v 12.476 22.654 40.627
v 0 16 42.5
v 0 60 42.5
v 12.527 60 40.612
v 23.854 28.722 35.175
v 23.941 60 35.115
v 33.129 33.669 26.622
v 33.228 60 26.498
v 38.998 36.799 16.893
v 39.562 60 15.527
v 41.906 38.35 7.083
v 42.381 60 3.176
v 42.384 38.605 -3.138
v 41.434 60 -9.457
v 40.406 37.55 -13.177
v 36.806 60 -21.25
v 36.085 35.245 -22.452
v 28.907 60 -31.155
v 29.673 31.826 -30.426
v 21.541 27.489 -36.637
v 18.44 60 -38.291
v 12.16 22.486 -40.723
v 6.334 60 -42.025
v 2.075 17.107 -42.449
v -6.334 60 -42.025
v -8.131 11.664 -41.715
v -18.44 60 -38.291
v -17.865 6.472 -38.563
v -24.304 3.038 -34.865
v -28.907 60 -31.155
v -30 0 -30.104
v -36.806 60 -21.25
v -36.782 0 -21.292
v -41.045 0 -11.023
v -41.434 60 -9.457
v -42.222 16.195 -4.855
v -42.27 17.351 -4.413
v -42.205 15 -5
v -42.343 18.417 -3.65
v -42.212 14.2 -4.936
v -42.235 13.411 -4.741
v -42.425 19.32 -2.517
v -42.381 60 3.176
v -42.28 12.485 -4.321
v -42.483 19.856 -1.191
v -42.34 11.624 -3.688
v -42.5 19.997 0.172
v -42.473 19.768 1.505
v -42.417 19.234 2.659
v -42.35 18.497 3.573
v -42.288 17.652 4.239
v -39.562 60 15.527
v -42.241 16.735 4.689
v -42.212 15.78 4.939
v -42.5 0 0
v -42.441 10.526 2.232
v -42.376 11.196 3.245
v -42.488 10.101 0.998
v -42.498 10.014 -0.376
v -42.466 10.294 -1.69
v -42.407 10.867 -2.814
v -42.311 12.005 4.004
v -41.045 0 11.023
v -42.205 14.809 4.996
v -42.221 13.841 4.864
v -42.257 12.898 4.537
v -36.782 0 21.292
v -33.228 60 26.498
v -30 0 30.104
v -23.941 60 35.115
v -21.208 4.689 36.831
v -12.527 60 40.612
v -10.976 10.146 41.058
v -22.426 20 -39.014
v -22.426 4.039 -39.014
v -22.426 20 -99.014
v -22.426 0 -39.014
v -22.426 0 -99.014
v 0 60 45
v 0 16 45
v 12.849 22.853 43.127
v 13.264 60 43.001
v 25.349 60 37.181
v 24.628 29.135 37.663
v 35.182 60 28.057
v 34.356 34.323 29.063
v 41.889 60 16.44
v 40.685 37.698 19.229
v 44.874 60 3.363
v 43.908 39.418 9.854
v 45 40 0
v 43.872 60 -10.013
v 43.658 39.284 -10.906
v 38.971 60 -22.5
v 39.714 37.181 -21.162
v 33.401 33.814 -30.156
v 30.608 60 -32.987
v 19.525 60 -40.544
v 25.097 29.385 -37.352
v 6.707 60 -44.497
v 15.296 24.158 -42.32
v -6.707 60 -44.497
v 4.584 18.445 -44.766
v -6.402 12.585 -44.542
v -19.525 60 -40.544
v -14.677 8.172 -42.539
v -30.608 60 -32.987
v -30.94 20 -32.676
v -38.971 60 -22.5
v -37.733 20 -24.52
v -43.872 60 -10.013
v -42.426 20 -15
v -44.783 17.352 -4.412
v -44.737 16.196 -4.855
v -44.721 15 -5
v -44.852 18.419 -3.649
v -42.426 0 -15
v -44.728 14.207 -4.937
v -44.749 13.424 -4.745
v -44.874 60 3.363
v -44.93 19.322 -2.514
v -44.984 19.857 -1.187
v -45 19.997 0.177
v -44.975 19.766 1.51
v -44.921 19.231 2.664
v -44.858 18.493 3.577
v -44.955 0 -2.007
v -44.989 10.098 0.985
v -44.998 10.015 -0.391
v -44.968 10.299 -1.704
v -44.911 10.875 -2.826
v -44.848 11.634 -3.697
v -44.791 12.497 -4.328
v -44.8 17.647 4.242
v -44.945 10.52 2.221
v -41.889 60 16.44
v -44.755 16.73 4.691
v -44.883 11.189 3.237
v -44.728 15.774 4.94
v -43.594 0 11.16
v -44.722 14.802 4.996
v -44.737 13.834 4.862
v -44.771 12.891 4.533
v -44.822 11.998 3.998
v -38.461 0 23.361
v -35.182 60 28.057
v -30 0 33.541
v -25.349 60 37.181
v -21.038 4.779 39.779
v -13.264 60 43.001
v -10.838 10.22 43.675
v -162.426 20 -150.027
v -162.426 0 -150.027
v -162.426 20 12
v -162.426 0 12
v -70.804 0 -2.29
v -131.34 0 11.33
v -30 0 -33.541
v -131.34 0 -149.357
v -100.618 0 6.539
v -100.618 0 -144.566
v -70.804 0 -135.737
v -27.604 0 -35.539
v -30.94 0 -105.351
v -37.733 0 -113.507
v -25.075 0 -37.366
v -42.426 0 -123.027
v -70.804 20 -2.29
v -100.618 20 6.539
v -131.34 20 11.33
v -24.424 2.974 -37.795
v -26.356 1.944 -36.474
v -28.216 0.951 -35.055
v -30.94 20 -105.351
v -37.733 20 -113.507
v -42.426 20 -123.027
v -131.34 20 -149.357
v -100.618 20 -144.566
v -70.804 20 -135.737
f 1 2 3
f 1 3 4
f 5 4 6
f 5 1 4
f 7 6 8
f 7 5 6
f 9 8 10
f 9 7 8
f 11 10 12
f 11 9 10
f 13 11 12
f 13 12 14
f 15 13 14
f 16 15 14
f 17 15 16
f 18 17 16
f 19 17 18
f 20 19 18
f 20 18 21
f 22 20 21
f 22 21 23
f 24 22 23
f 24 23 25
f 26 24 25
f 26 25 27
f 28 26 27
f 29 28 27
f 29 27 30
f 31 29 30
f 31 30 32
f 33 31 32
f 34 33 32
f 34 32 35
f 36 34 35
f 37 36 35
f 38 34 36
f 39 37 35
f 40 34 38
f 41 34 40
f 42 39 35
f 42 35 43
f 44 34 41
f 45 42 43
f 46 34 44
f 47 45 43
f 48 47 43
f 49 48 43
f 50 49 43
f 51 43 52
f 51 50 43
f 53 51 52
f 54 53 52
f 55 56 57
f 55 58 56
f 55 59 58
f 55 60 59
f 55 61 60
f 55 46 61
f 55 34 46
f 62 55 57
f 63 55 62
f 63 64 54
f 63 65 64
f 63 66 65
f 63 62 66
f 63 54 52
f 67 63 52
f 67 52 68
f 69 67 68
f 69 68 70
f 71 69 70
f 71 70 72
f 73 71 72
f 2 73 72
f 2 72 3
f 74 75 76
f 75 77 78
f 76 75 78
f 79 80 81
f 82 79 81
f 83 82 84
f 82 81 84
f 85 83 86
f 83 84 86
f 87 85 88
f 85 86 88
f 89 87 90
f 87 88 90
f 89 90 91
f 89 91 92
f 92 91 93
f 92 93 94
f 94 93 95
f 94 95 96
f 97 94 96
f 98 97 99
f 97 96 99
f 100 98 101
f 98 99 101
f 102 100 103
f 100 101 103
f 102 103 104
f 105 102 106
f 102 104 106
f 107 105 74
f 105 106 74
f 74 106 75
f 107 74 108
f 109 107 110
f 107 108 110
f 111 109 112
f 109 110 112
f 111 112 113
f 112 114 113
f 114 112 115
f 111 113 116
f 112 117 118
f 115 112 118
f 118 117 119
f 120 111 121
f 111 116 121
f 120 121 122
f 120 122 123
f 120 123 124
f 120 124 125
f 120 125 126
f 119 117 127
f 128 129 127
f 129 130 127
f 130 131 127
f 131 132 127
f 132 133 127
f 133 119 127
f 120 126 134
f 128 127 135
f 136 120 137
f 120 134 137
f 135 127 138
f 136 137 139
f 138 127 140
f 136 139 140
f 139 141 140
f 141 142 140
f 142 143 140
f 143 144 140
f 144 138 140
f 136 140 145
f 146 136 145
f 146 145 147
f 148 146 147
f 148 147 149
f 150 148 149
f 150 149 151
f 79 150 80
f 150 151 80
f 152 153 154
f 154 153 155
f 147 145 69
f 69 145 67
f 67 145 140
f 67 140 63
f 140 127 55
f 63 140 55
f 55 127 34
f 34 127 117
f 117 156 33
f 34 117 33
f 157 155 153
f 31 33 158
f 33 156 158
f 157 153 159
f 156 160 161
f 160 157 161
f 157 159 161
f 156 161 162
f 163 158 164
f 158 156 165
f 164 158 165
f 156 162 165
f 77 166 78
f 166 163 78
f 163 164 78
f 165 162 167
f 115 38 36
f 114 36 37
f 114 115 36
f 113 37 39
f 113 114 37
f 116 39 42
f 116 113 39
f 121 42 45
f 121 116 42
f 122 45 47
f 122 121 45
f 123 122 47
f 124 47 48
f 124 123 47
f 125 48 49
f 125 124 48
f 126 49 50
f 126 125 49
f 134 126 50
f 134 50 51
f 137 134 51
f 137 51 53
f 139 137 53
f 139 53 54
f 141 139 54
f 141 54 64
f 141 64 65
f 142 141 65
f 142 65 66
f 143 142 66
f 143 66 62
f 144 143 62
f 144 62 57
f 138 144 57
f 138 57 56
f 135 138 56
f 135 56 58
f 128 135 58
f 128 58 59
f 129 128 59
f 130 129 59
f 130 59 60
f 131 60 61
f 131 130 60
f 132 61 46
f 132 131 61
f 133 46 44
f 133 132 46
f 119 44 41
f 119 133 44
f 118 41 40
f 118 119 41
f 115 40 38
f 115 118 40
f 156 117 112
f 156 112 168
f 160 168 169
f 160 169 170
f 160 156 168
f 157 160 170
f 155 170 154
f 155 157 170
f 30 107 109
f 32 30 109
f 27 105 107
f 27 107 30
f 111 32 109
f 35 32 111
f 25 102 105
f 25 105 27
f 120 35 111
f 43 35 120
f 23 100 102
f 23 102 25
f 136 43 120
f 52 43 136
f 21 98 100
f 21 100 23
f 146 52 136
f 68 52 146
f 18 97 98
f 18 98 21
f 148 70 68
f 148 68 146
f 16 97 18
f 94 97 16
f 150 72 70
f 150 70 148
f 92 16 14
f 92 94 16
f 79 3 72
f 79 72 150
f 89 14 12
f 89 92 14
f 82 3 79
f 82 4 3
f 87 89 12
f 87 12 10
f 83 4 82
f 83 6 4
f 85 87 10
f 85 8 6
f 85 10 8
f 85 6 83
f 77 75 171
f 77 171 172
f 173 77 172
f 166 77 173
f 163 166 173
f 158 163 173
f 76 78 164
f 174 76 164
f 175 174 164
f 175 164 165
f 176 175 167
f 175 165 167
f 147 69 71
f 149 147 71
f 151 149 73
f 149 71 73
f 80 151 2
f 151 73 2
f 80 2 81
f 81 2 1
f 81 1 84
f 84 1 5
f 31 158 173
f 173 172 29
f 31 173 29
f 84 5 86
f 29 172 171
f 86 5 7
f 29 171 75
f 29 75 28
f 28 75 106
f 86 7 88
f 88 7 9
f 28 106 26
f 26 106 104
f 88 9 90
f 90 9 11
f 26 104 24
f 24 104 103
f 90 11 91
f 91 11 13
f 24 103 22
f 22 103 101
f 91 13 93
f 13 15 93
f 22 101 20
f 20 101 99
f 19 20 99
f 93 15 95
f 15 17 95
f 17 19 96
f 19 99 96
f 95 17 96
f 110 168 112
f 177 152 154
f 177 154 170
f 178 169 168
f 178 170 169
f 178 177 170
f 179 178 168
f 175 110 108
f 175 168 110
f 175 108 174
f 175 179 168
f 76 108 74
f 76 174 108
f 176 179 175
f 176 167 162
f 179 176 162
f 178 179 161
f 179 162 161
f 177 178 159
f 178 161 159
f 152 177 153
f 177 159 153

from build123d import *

# Parameters (mm, degrees)
SKETCH2_R               = 45
SKETCH2_R_2             = 42.5
BOSS_EXTRUDE1_DEPTH     = 60
CUT_EXTRUDE1_DEPTH      = 88.464278423
CUT_EXTRUDE1_DEPTH_BACK = 88.464278423
CUT_EXTRUDE2_DEPTH      = 88.464278423
CUT_EXTRUDE2_DEPTH_BACK = 88.464278423
SKETCH4_R               = 5
BOSS_EXTRUDE2_DEPTH     = 20
MIRROR1_DEPTH           = 20


# Read off the part's stored shape, not the designer's step: Mirror1
with BuildPart() as part:
    # Sketch2 → Boss-Extrude1 (new body)
    with BuildSketch(Plane(origin=(0, 0, 0), x_dir=(1, 0, 0), z_dir=(0, 1, 0))):
        with Locations(Location((0, 0, 0), (0, 0, 270))):
            Circle(SKETCH2_R)
        with Locations(Location((0, 0, 0), (0, 0, 270))):
            Circle(SKETCH2_R_2, mode=Mode.SUBTRACT)
    extrude(amount=BOSS_EXTRUDE1_DEPTH)

    # Sketch3 → Cut-Extrude1 (cut, two sides: drawn at the far end of the back side and taken through both)
    with BuildSketch(Plane.XY.offset(-CUT_EXTRUDE1_DEPTH_BACK)):
        Polygon((-30, 0), (45, 40), (45, 0), align=None)
    extrude(amount=CUT_EXTRUDE1_DEPTH + CUT_EXTRUDE1_DEPTH_BACK, mode=Mode.SUBTRACT)

    # Sketch4 → Cut-Extrude2 (cut, two sides: drawn at the far end of the back side and taken through both)
    with BuildSketch(Plane(origin=(0, 0, 0), x_dir=(0, 0, -1), z_dir=(1, 0, 0)).offset(-CUT_EXTRUDE2_DEPTH_BACK)):
        with Locations((0, 15)):
            Circle(SKETCH4_R)
    extrude(amount=CUT_EXTRUDE2_DEPTH + CUT_EXTRUDE2_DEPTH_BACK, mode=Mode.SUBTRACT)

    # Sketch5 → Boss-Extrude2 (add)
    with BuildSketch(Plane(origin=(0, 0, 0), x_dir=(1, 0, 0), z_dir=(0, 1, 0))):
        with BuildLine():
            ThreePointArc((-22.426406871, 39.013539635), (-34.577946498, 28.798708582), (-42.426406871, 15))
            ThreePointArc((-42.426406871, 15), (-100.617737833, -6.538529057), (-162.426406871, -12))
            Line((-162.426406871, -12), (-162.426406871, 69.013539635))
            Line((-162.426406871, 69.013539635), (-22.426406871, 69.013539635))
            Line((-22.426406871, 69.013539635), (-22.426406871, 39.013539635))
        make_face()
    extrude(amount=BOSS_EXTRUDE2_DEPTH)

    # Mirror1 outline → Mirror1 (add)
    with BuildSketch(Plane(origin=(0, 0, 0), x_dir=(1, 0, 0), z_dir=(0, 1, 0))):
        with BuildLine():
            Line((-22.426406871, 69.013539635), (-22.426406871, 99.013539635))
            ThreePointArc((-22.426406871, 99.013539635), (-34.577946498, 109.228370688), (-42.426406871, 123.02707927))
            ThreePointArc((-42.426406871, 123.02707927), (-100.617737833, 144.565608327), (-162.426406871, 150.02707927))
            Line((-162.426406871, 150.02707927), (-162.426406871, 69.013539635))
            Line((-162.426406871, 69.013539635), (-22.426406871, 69.013539635))
        make_face()
    extrude(amount=MIRROR1_DEPTH)


solid = part.part
